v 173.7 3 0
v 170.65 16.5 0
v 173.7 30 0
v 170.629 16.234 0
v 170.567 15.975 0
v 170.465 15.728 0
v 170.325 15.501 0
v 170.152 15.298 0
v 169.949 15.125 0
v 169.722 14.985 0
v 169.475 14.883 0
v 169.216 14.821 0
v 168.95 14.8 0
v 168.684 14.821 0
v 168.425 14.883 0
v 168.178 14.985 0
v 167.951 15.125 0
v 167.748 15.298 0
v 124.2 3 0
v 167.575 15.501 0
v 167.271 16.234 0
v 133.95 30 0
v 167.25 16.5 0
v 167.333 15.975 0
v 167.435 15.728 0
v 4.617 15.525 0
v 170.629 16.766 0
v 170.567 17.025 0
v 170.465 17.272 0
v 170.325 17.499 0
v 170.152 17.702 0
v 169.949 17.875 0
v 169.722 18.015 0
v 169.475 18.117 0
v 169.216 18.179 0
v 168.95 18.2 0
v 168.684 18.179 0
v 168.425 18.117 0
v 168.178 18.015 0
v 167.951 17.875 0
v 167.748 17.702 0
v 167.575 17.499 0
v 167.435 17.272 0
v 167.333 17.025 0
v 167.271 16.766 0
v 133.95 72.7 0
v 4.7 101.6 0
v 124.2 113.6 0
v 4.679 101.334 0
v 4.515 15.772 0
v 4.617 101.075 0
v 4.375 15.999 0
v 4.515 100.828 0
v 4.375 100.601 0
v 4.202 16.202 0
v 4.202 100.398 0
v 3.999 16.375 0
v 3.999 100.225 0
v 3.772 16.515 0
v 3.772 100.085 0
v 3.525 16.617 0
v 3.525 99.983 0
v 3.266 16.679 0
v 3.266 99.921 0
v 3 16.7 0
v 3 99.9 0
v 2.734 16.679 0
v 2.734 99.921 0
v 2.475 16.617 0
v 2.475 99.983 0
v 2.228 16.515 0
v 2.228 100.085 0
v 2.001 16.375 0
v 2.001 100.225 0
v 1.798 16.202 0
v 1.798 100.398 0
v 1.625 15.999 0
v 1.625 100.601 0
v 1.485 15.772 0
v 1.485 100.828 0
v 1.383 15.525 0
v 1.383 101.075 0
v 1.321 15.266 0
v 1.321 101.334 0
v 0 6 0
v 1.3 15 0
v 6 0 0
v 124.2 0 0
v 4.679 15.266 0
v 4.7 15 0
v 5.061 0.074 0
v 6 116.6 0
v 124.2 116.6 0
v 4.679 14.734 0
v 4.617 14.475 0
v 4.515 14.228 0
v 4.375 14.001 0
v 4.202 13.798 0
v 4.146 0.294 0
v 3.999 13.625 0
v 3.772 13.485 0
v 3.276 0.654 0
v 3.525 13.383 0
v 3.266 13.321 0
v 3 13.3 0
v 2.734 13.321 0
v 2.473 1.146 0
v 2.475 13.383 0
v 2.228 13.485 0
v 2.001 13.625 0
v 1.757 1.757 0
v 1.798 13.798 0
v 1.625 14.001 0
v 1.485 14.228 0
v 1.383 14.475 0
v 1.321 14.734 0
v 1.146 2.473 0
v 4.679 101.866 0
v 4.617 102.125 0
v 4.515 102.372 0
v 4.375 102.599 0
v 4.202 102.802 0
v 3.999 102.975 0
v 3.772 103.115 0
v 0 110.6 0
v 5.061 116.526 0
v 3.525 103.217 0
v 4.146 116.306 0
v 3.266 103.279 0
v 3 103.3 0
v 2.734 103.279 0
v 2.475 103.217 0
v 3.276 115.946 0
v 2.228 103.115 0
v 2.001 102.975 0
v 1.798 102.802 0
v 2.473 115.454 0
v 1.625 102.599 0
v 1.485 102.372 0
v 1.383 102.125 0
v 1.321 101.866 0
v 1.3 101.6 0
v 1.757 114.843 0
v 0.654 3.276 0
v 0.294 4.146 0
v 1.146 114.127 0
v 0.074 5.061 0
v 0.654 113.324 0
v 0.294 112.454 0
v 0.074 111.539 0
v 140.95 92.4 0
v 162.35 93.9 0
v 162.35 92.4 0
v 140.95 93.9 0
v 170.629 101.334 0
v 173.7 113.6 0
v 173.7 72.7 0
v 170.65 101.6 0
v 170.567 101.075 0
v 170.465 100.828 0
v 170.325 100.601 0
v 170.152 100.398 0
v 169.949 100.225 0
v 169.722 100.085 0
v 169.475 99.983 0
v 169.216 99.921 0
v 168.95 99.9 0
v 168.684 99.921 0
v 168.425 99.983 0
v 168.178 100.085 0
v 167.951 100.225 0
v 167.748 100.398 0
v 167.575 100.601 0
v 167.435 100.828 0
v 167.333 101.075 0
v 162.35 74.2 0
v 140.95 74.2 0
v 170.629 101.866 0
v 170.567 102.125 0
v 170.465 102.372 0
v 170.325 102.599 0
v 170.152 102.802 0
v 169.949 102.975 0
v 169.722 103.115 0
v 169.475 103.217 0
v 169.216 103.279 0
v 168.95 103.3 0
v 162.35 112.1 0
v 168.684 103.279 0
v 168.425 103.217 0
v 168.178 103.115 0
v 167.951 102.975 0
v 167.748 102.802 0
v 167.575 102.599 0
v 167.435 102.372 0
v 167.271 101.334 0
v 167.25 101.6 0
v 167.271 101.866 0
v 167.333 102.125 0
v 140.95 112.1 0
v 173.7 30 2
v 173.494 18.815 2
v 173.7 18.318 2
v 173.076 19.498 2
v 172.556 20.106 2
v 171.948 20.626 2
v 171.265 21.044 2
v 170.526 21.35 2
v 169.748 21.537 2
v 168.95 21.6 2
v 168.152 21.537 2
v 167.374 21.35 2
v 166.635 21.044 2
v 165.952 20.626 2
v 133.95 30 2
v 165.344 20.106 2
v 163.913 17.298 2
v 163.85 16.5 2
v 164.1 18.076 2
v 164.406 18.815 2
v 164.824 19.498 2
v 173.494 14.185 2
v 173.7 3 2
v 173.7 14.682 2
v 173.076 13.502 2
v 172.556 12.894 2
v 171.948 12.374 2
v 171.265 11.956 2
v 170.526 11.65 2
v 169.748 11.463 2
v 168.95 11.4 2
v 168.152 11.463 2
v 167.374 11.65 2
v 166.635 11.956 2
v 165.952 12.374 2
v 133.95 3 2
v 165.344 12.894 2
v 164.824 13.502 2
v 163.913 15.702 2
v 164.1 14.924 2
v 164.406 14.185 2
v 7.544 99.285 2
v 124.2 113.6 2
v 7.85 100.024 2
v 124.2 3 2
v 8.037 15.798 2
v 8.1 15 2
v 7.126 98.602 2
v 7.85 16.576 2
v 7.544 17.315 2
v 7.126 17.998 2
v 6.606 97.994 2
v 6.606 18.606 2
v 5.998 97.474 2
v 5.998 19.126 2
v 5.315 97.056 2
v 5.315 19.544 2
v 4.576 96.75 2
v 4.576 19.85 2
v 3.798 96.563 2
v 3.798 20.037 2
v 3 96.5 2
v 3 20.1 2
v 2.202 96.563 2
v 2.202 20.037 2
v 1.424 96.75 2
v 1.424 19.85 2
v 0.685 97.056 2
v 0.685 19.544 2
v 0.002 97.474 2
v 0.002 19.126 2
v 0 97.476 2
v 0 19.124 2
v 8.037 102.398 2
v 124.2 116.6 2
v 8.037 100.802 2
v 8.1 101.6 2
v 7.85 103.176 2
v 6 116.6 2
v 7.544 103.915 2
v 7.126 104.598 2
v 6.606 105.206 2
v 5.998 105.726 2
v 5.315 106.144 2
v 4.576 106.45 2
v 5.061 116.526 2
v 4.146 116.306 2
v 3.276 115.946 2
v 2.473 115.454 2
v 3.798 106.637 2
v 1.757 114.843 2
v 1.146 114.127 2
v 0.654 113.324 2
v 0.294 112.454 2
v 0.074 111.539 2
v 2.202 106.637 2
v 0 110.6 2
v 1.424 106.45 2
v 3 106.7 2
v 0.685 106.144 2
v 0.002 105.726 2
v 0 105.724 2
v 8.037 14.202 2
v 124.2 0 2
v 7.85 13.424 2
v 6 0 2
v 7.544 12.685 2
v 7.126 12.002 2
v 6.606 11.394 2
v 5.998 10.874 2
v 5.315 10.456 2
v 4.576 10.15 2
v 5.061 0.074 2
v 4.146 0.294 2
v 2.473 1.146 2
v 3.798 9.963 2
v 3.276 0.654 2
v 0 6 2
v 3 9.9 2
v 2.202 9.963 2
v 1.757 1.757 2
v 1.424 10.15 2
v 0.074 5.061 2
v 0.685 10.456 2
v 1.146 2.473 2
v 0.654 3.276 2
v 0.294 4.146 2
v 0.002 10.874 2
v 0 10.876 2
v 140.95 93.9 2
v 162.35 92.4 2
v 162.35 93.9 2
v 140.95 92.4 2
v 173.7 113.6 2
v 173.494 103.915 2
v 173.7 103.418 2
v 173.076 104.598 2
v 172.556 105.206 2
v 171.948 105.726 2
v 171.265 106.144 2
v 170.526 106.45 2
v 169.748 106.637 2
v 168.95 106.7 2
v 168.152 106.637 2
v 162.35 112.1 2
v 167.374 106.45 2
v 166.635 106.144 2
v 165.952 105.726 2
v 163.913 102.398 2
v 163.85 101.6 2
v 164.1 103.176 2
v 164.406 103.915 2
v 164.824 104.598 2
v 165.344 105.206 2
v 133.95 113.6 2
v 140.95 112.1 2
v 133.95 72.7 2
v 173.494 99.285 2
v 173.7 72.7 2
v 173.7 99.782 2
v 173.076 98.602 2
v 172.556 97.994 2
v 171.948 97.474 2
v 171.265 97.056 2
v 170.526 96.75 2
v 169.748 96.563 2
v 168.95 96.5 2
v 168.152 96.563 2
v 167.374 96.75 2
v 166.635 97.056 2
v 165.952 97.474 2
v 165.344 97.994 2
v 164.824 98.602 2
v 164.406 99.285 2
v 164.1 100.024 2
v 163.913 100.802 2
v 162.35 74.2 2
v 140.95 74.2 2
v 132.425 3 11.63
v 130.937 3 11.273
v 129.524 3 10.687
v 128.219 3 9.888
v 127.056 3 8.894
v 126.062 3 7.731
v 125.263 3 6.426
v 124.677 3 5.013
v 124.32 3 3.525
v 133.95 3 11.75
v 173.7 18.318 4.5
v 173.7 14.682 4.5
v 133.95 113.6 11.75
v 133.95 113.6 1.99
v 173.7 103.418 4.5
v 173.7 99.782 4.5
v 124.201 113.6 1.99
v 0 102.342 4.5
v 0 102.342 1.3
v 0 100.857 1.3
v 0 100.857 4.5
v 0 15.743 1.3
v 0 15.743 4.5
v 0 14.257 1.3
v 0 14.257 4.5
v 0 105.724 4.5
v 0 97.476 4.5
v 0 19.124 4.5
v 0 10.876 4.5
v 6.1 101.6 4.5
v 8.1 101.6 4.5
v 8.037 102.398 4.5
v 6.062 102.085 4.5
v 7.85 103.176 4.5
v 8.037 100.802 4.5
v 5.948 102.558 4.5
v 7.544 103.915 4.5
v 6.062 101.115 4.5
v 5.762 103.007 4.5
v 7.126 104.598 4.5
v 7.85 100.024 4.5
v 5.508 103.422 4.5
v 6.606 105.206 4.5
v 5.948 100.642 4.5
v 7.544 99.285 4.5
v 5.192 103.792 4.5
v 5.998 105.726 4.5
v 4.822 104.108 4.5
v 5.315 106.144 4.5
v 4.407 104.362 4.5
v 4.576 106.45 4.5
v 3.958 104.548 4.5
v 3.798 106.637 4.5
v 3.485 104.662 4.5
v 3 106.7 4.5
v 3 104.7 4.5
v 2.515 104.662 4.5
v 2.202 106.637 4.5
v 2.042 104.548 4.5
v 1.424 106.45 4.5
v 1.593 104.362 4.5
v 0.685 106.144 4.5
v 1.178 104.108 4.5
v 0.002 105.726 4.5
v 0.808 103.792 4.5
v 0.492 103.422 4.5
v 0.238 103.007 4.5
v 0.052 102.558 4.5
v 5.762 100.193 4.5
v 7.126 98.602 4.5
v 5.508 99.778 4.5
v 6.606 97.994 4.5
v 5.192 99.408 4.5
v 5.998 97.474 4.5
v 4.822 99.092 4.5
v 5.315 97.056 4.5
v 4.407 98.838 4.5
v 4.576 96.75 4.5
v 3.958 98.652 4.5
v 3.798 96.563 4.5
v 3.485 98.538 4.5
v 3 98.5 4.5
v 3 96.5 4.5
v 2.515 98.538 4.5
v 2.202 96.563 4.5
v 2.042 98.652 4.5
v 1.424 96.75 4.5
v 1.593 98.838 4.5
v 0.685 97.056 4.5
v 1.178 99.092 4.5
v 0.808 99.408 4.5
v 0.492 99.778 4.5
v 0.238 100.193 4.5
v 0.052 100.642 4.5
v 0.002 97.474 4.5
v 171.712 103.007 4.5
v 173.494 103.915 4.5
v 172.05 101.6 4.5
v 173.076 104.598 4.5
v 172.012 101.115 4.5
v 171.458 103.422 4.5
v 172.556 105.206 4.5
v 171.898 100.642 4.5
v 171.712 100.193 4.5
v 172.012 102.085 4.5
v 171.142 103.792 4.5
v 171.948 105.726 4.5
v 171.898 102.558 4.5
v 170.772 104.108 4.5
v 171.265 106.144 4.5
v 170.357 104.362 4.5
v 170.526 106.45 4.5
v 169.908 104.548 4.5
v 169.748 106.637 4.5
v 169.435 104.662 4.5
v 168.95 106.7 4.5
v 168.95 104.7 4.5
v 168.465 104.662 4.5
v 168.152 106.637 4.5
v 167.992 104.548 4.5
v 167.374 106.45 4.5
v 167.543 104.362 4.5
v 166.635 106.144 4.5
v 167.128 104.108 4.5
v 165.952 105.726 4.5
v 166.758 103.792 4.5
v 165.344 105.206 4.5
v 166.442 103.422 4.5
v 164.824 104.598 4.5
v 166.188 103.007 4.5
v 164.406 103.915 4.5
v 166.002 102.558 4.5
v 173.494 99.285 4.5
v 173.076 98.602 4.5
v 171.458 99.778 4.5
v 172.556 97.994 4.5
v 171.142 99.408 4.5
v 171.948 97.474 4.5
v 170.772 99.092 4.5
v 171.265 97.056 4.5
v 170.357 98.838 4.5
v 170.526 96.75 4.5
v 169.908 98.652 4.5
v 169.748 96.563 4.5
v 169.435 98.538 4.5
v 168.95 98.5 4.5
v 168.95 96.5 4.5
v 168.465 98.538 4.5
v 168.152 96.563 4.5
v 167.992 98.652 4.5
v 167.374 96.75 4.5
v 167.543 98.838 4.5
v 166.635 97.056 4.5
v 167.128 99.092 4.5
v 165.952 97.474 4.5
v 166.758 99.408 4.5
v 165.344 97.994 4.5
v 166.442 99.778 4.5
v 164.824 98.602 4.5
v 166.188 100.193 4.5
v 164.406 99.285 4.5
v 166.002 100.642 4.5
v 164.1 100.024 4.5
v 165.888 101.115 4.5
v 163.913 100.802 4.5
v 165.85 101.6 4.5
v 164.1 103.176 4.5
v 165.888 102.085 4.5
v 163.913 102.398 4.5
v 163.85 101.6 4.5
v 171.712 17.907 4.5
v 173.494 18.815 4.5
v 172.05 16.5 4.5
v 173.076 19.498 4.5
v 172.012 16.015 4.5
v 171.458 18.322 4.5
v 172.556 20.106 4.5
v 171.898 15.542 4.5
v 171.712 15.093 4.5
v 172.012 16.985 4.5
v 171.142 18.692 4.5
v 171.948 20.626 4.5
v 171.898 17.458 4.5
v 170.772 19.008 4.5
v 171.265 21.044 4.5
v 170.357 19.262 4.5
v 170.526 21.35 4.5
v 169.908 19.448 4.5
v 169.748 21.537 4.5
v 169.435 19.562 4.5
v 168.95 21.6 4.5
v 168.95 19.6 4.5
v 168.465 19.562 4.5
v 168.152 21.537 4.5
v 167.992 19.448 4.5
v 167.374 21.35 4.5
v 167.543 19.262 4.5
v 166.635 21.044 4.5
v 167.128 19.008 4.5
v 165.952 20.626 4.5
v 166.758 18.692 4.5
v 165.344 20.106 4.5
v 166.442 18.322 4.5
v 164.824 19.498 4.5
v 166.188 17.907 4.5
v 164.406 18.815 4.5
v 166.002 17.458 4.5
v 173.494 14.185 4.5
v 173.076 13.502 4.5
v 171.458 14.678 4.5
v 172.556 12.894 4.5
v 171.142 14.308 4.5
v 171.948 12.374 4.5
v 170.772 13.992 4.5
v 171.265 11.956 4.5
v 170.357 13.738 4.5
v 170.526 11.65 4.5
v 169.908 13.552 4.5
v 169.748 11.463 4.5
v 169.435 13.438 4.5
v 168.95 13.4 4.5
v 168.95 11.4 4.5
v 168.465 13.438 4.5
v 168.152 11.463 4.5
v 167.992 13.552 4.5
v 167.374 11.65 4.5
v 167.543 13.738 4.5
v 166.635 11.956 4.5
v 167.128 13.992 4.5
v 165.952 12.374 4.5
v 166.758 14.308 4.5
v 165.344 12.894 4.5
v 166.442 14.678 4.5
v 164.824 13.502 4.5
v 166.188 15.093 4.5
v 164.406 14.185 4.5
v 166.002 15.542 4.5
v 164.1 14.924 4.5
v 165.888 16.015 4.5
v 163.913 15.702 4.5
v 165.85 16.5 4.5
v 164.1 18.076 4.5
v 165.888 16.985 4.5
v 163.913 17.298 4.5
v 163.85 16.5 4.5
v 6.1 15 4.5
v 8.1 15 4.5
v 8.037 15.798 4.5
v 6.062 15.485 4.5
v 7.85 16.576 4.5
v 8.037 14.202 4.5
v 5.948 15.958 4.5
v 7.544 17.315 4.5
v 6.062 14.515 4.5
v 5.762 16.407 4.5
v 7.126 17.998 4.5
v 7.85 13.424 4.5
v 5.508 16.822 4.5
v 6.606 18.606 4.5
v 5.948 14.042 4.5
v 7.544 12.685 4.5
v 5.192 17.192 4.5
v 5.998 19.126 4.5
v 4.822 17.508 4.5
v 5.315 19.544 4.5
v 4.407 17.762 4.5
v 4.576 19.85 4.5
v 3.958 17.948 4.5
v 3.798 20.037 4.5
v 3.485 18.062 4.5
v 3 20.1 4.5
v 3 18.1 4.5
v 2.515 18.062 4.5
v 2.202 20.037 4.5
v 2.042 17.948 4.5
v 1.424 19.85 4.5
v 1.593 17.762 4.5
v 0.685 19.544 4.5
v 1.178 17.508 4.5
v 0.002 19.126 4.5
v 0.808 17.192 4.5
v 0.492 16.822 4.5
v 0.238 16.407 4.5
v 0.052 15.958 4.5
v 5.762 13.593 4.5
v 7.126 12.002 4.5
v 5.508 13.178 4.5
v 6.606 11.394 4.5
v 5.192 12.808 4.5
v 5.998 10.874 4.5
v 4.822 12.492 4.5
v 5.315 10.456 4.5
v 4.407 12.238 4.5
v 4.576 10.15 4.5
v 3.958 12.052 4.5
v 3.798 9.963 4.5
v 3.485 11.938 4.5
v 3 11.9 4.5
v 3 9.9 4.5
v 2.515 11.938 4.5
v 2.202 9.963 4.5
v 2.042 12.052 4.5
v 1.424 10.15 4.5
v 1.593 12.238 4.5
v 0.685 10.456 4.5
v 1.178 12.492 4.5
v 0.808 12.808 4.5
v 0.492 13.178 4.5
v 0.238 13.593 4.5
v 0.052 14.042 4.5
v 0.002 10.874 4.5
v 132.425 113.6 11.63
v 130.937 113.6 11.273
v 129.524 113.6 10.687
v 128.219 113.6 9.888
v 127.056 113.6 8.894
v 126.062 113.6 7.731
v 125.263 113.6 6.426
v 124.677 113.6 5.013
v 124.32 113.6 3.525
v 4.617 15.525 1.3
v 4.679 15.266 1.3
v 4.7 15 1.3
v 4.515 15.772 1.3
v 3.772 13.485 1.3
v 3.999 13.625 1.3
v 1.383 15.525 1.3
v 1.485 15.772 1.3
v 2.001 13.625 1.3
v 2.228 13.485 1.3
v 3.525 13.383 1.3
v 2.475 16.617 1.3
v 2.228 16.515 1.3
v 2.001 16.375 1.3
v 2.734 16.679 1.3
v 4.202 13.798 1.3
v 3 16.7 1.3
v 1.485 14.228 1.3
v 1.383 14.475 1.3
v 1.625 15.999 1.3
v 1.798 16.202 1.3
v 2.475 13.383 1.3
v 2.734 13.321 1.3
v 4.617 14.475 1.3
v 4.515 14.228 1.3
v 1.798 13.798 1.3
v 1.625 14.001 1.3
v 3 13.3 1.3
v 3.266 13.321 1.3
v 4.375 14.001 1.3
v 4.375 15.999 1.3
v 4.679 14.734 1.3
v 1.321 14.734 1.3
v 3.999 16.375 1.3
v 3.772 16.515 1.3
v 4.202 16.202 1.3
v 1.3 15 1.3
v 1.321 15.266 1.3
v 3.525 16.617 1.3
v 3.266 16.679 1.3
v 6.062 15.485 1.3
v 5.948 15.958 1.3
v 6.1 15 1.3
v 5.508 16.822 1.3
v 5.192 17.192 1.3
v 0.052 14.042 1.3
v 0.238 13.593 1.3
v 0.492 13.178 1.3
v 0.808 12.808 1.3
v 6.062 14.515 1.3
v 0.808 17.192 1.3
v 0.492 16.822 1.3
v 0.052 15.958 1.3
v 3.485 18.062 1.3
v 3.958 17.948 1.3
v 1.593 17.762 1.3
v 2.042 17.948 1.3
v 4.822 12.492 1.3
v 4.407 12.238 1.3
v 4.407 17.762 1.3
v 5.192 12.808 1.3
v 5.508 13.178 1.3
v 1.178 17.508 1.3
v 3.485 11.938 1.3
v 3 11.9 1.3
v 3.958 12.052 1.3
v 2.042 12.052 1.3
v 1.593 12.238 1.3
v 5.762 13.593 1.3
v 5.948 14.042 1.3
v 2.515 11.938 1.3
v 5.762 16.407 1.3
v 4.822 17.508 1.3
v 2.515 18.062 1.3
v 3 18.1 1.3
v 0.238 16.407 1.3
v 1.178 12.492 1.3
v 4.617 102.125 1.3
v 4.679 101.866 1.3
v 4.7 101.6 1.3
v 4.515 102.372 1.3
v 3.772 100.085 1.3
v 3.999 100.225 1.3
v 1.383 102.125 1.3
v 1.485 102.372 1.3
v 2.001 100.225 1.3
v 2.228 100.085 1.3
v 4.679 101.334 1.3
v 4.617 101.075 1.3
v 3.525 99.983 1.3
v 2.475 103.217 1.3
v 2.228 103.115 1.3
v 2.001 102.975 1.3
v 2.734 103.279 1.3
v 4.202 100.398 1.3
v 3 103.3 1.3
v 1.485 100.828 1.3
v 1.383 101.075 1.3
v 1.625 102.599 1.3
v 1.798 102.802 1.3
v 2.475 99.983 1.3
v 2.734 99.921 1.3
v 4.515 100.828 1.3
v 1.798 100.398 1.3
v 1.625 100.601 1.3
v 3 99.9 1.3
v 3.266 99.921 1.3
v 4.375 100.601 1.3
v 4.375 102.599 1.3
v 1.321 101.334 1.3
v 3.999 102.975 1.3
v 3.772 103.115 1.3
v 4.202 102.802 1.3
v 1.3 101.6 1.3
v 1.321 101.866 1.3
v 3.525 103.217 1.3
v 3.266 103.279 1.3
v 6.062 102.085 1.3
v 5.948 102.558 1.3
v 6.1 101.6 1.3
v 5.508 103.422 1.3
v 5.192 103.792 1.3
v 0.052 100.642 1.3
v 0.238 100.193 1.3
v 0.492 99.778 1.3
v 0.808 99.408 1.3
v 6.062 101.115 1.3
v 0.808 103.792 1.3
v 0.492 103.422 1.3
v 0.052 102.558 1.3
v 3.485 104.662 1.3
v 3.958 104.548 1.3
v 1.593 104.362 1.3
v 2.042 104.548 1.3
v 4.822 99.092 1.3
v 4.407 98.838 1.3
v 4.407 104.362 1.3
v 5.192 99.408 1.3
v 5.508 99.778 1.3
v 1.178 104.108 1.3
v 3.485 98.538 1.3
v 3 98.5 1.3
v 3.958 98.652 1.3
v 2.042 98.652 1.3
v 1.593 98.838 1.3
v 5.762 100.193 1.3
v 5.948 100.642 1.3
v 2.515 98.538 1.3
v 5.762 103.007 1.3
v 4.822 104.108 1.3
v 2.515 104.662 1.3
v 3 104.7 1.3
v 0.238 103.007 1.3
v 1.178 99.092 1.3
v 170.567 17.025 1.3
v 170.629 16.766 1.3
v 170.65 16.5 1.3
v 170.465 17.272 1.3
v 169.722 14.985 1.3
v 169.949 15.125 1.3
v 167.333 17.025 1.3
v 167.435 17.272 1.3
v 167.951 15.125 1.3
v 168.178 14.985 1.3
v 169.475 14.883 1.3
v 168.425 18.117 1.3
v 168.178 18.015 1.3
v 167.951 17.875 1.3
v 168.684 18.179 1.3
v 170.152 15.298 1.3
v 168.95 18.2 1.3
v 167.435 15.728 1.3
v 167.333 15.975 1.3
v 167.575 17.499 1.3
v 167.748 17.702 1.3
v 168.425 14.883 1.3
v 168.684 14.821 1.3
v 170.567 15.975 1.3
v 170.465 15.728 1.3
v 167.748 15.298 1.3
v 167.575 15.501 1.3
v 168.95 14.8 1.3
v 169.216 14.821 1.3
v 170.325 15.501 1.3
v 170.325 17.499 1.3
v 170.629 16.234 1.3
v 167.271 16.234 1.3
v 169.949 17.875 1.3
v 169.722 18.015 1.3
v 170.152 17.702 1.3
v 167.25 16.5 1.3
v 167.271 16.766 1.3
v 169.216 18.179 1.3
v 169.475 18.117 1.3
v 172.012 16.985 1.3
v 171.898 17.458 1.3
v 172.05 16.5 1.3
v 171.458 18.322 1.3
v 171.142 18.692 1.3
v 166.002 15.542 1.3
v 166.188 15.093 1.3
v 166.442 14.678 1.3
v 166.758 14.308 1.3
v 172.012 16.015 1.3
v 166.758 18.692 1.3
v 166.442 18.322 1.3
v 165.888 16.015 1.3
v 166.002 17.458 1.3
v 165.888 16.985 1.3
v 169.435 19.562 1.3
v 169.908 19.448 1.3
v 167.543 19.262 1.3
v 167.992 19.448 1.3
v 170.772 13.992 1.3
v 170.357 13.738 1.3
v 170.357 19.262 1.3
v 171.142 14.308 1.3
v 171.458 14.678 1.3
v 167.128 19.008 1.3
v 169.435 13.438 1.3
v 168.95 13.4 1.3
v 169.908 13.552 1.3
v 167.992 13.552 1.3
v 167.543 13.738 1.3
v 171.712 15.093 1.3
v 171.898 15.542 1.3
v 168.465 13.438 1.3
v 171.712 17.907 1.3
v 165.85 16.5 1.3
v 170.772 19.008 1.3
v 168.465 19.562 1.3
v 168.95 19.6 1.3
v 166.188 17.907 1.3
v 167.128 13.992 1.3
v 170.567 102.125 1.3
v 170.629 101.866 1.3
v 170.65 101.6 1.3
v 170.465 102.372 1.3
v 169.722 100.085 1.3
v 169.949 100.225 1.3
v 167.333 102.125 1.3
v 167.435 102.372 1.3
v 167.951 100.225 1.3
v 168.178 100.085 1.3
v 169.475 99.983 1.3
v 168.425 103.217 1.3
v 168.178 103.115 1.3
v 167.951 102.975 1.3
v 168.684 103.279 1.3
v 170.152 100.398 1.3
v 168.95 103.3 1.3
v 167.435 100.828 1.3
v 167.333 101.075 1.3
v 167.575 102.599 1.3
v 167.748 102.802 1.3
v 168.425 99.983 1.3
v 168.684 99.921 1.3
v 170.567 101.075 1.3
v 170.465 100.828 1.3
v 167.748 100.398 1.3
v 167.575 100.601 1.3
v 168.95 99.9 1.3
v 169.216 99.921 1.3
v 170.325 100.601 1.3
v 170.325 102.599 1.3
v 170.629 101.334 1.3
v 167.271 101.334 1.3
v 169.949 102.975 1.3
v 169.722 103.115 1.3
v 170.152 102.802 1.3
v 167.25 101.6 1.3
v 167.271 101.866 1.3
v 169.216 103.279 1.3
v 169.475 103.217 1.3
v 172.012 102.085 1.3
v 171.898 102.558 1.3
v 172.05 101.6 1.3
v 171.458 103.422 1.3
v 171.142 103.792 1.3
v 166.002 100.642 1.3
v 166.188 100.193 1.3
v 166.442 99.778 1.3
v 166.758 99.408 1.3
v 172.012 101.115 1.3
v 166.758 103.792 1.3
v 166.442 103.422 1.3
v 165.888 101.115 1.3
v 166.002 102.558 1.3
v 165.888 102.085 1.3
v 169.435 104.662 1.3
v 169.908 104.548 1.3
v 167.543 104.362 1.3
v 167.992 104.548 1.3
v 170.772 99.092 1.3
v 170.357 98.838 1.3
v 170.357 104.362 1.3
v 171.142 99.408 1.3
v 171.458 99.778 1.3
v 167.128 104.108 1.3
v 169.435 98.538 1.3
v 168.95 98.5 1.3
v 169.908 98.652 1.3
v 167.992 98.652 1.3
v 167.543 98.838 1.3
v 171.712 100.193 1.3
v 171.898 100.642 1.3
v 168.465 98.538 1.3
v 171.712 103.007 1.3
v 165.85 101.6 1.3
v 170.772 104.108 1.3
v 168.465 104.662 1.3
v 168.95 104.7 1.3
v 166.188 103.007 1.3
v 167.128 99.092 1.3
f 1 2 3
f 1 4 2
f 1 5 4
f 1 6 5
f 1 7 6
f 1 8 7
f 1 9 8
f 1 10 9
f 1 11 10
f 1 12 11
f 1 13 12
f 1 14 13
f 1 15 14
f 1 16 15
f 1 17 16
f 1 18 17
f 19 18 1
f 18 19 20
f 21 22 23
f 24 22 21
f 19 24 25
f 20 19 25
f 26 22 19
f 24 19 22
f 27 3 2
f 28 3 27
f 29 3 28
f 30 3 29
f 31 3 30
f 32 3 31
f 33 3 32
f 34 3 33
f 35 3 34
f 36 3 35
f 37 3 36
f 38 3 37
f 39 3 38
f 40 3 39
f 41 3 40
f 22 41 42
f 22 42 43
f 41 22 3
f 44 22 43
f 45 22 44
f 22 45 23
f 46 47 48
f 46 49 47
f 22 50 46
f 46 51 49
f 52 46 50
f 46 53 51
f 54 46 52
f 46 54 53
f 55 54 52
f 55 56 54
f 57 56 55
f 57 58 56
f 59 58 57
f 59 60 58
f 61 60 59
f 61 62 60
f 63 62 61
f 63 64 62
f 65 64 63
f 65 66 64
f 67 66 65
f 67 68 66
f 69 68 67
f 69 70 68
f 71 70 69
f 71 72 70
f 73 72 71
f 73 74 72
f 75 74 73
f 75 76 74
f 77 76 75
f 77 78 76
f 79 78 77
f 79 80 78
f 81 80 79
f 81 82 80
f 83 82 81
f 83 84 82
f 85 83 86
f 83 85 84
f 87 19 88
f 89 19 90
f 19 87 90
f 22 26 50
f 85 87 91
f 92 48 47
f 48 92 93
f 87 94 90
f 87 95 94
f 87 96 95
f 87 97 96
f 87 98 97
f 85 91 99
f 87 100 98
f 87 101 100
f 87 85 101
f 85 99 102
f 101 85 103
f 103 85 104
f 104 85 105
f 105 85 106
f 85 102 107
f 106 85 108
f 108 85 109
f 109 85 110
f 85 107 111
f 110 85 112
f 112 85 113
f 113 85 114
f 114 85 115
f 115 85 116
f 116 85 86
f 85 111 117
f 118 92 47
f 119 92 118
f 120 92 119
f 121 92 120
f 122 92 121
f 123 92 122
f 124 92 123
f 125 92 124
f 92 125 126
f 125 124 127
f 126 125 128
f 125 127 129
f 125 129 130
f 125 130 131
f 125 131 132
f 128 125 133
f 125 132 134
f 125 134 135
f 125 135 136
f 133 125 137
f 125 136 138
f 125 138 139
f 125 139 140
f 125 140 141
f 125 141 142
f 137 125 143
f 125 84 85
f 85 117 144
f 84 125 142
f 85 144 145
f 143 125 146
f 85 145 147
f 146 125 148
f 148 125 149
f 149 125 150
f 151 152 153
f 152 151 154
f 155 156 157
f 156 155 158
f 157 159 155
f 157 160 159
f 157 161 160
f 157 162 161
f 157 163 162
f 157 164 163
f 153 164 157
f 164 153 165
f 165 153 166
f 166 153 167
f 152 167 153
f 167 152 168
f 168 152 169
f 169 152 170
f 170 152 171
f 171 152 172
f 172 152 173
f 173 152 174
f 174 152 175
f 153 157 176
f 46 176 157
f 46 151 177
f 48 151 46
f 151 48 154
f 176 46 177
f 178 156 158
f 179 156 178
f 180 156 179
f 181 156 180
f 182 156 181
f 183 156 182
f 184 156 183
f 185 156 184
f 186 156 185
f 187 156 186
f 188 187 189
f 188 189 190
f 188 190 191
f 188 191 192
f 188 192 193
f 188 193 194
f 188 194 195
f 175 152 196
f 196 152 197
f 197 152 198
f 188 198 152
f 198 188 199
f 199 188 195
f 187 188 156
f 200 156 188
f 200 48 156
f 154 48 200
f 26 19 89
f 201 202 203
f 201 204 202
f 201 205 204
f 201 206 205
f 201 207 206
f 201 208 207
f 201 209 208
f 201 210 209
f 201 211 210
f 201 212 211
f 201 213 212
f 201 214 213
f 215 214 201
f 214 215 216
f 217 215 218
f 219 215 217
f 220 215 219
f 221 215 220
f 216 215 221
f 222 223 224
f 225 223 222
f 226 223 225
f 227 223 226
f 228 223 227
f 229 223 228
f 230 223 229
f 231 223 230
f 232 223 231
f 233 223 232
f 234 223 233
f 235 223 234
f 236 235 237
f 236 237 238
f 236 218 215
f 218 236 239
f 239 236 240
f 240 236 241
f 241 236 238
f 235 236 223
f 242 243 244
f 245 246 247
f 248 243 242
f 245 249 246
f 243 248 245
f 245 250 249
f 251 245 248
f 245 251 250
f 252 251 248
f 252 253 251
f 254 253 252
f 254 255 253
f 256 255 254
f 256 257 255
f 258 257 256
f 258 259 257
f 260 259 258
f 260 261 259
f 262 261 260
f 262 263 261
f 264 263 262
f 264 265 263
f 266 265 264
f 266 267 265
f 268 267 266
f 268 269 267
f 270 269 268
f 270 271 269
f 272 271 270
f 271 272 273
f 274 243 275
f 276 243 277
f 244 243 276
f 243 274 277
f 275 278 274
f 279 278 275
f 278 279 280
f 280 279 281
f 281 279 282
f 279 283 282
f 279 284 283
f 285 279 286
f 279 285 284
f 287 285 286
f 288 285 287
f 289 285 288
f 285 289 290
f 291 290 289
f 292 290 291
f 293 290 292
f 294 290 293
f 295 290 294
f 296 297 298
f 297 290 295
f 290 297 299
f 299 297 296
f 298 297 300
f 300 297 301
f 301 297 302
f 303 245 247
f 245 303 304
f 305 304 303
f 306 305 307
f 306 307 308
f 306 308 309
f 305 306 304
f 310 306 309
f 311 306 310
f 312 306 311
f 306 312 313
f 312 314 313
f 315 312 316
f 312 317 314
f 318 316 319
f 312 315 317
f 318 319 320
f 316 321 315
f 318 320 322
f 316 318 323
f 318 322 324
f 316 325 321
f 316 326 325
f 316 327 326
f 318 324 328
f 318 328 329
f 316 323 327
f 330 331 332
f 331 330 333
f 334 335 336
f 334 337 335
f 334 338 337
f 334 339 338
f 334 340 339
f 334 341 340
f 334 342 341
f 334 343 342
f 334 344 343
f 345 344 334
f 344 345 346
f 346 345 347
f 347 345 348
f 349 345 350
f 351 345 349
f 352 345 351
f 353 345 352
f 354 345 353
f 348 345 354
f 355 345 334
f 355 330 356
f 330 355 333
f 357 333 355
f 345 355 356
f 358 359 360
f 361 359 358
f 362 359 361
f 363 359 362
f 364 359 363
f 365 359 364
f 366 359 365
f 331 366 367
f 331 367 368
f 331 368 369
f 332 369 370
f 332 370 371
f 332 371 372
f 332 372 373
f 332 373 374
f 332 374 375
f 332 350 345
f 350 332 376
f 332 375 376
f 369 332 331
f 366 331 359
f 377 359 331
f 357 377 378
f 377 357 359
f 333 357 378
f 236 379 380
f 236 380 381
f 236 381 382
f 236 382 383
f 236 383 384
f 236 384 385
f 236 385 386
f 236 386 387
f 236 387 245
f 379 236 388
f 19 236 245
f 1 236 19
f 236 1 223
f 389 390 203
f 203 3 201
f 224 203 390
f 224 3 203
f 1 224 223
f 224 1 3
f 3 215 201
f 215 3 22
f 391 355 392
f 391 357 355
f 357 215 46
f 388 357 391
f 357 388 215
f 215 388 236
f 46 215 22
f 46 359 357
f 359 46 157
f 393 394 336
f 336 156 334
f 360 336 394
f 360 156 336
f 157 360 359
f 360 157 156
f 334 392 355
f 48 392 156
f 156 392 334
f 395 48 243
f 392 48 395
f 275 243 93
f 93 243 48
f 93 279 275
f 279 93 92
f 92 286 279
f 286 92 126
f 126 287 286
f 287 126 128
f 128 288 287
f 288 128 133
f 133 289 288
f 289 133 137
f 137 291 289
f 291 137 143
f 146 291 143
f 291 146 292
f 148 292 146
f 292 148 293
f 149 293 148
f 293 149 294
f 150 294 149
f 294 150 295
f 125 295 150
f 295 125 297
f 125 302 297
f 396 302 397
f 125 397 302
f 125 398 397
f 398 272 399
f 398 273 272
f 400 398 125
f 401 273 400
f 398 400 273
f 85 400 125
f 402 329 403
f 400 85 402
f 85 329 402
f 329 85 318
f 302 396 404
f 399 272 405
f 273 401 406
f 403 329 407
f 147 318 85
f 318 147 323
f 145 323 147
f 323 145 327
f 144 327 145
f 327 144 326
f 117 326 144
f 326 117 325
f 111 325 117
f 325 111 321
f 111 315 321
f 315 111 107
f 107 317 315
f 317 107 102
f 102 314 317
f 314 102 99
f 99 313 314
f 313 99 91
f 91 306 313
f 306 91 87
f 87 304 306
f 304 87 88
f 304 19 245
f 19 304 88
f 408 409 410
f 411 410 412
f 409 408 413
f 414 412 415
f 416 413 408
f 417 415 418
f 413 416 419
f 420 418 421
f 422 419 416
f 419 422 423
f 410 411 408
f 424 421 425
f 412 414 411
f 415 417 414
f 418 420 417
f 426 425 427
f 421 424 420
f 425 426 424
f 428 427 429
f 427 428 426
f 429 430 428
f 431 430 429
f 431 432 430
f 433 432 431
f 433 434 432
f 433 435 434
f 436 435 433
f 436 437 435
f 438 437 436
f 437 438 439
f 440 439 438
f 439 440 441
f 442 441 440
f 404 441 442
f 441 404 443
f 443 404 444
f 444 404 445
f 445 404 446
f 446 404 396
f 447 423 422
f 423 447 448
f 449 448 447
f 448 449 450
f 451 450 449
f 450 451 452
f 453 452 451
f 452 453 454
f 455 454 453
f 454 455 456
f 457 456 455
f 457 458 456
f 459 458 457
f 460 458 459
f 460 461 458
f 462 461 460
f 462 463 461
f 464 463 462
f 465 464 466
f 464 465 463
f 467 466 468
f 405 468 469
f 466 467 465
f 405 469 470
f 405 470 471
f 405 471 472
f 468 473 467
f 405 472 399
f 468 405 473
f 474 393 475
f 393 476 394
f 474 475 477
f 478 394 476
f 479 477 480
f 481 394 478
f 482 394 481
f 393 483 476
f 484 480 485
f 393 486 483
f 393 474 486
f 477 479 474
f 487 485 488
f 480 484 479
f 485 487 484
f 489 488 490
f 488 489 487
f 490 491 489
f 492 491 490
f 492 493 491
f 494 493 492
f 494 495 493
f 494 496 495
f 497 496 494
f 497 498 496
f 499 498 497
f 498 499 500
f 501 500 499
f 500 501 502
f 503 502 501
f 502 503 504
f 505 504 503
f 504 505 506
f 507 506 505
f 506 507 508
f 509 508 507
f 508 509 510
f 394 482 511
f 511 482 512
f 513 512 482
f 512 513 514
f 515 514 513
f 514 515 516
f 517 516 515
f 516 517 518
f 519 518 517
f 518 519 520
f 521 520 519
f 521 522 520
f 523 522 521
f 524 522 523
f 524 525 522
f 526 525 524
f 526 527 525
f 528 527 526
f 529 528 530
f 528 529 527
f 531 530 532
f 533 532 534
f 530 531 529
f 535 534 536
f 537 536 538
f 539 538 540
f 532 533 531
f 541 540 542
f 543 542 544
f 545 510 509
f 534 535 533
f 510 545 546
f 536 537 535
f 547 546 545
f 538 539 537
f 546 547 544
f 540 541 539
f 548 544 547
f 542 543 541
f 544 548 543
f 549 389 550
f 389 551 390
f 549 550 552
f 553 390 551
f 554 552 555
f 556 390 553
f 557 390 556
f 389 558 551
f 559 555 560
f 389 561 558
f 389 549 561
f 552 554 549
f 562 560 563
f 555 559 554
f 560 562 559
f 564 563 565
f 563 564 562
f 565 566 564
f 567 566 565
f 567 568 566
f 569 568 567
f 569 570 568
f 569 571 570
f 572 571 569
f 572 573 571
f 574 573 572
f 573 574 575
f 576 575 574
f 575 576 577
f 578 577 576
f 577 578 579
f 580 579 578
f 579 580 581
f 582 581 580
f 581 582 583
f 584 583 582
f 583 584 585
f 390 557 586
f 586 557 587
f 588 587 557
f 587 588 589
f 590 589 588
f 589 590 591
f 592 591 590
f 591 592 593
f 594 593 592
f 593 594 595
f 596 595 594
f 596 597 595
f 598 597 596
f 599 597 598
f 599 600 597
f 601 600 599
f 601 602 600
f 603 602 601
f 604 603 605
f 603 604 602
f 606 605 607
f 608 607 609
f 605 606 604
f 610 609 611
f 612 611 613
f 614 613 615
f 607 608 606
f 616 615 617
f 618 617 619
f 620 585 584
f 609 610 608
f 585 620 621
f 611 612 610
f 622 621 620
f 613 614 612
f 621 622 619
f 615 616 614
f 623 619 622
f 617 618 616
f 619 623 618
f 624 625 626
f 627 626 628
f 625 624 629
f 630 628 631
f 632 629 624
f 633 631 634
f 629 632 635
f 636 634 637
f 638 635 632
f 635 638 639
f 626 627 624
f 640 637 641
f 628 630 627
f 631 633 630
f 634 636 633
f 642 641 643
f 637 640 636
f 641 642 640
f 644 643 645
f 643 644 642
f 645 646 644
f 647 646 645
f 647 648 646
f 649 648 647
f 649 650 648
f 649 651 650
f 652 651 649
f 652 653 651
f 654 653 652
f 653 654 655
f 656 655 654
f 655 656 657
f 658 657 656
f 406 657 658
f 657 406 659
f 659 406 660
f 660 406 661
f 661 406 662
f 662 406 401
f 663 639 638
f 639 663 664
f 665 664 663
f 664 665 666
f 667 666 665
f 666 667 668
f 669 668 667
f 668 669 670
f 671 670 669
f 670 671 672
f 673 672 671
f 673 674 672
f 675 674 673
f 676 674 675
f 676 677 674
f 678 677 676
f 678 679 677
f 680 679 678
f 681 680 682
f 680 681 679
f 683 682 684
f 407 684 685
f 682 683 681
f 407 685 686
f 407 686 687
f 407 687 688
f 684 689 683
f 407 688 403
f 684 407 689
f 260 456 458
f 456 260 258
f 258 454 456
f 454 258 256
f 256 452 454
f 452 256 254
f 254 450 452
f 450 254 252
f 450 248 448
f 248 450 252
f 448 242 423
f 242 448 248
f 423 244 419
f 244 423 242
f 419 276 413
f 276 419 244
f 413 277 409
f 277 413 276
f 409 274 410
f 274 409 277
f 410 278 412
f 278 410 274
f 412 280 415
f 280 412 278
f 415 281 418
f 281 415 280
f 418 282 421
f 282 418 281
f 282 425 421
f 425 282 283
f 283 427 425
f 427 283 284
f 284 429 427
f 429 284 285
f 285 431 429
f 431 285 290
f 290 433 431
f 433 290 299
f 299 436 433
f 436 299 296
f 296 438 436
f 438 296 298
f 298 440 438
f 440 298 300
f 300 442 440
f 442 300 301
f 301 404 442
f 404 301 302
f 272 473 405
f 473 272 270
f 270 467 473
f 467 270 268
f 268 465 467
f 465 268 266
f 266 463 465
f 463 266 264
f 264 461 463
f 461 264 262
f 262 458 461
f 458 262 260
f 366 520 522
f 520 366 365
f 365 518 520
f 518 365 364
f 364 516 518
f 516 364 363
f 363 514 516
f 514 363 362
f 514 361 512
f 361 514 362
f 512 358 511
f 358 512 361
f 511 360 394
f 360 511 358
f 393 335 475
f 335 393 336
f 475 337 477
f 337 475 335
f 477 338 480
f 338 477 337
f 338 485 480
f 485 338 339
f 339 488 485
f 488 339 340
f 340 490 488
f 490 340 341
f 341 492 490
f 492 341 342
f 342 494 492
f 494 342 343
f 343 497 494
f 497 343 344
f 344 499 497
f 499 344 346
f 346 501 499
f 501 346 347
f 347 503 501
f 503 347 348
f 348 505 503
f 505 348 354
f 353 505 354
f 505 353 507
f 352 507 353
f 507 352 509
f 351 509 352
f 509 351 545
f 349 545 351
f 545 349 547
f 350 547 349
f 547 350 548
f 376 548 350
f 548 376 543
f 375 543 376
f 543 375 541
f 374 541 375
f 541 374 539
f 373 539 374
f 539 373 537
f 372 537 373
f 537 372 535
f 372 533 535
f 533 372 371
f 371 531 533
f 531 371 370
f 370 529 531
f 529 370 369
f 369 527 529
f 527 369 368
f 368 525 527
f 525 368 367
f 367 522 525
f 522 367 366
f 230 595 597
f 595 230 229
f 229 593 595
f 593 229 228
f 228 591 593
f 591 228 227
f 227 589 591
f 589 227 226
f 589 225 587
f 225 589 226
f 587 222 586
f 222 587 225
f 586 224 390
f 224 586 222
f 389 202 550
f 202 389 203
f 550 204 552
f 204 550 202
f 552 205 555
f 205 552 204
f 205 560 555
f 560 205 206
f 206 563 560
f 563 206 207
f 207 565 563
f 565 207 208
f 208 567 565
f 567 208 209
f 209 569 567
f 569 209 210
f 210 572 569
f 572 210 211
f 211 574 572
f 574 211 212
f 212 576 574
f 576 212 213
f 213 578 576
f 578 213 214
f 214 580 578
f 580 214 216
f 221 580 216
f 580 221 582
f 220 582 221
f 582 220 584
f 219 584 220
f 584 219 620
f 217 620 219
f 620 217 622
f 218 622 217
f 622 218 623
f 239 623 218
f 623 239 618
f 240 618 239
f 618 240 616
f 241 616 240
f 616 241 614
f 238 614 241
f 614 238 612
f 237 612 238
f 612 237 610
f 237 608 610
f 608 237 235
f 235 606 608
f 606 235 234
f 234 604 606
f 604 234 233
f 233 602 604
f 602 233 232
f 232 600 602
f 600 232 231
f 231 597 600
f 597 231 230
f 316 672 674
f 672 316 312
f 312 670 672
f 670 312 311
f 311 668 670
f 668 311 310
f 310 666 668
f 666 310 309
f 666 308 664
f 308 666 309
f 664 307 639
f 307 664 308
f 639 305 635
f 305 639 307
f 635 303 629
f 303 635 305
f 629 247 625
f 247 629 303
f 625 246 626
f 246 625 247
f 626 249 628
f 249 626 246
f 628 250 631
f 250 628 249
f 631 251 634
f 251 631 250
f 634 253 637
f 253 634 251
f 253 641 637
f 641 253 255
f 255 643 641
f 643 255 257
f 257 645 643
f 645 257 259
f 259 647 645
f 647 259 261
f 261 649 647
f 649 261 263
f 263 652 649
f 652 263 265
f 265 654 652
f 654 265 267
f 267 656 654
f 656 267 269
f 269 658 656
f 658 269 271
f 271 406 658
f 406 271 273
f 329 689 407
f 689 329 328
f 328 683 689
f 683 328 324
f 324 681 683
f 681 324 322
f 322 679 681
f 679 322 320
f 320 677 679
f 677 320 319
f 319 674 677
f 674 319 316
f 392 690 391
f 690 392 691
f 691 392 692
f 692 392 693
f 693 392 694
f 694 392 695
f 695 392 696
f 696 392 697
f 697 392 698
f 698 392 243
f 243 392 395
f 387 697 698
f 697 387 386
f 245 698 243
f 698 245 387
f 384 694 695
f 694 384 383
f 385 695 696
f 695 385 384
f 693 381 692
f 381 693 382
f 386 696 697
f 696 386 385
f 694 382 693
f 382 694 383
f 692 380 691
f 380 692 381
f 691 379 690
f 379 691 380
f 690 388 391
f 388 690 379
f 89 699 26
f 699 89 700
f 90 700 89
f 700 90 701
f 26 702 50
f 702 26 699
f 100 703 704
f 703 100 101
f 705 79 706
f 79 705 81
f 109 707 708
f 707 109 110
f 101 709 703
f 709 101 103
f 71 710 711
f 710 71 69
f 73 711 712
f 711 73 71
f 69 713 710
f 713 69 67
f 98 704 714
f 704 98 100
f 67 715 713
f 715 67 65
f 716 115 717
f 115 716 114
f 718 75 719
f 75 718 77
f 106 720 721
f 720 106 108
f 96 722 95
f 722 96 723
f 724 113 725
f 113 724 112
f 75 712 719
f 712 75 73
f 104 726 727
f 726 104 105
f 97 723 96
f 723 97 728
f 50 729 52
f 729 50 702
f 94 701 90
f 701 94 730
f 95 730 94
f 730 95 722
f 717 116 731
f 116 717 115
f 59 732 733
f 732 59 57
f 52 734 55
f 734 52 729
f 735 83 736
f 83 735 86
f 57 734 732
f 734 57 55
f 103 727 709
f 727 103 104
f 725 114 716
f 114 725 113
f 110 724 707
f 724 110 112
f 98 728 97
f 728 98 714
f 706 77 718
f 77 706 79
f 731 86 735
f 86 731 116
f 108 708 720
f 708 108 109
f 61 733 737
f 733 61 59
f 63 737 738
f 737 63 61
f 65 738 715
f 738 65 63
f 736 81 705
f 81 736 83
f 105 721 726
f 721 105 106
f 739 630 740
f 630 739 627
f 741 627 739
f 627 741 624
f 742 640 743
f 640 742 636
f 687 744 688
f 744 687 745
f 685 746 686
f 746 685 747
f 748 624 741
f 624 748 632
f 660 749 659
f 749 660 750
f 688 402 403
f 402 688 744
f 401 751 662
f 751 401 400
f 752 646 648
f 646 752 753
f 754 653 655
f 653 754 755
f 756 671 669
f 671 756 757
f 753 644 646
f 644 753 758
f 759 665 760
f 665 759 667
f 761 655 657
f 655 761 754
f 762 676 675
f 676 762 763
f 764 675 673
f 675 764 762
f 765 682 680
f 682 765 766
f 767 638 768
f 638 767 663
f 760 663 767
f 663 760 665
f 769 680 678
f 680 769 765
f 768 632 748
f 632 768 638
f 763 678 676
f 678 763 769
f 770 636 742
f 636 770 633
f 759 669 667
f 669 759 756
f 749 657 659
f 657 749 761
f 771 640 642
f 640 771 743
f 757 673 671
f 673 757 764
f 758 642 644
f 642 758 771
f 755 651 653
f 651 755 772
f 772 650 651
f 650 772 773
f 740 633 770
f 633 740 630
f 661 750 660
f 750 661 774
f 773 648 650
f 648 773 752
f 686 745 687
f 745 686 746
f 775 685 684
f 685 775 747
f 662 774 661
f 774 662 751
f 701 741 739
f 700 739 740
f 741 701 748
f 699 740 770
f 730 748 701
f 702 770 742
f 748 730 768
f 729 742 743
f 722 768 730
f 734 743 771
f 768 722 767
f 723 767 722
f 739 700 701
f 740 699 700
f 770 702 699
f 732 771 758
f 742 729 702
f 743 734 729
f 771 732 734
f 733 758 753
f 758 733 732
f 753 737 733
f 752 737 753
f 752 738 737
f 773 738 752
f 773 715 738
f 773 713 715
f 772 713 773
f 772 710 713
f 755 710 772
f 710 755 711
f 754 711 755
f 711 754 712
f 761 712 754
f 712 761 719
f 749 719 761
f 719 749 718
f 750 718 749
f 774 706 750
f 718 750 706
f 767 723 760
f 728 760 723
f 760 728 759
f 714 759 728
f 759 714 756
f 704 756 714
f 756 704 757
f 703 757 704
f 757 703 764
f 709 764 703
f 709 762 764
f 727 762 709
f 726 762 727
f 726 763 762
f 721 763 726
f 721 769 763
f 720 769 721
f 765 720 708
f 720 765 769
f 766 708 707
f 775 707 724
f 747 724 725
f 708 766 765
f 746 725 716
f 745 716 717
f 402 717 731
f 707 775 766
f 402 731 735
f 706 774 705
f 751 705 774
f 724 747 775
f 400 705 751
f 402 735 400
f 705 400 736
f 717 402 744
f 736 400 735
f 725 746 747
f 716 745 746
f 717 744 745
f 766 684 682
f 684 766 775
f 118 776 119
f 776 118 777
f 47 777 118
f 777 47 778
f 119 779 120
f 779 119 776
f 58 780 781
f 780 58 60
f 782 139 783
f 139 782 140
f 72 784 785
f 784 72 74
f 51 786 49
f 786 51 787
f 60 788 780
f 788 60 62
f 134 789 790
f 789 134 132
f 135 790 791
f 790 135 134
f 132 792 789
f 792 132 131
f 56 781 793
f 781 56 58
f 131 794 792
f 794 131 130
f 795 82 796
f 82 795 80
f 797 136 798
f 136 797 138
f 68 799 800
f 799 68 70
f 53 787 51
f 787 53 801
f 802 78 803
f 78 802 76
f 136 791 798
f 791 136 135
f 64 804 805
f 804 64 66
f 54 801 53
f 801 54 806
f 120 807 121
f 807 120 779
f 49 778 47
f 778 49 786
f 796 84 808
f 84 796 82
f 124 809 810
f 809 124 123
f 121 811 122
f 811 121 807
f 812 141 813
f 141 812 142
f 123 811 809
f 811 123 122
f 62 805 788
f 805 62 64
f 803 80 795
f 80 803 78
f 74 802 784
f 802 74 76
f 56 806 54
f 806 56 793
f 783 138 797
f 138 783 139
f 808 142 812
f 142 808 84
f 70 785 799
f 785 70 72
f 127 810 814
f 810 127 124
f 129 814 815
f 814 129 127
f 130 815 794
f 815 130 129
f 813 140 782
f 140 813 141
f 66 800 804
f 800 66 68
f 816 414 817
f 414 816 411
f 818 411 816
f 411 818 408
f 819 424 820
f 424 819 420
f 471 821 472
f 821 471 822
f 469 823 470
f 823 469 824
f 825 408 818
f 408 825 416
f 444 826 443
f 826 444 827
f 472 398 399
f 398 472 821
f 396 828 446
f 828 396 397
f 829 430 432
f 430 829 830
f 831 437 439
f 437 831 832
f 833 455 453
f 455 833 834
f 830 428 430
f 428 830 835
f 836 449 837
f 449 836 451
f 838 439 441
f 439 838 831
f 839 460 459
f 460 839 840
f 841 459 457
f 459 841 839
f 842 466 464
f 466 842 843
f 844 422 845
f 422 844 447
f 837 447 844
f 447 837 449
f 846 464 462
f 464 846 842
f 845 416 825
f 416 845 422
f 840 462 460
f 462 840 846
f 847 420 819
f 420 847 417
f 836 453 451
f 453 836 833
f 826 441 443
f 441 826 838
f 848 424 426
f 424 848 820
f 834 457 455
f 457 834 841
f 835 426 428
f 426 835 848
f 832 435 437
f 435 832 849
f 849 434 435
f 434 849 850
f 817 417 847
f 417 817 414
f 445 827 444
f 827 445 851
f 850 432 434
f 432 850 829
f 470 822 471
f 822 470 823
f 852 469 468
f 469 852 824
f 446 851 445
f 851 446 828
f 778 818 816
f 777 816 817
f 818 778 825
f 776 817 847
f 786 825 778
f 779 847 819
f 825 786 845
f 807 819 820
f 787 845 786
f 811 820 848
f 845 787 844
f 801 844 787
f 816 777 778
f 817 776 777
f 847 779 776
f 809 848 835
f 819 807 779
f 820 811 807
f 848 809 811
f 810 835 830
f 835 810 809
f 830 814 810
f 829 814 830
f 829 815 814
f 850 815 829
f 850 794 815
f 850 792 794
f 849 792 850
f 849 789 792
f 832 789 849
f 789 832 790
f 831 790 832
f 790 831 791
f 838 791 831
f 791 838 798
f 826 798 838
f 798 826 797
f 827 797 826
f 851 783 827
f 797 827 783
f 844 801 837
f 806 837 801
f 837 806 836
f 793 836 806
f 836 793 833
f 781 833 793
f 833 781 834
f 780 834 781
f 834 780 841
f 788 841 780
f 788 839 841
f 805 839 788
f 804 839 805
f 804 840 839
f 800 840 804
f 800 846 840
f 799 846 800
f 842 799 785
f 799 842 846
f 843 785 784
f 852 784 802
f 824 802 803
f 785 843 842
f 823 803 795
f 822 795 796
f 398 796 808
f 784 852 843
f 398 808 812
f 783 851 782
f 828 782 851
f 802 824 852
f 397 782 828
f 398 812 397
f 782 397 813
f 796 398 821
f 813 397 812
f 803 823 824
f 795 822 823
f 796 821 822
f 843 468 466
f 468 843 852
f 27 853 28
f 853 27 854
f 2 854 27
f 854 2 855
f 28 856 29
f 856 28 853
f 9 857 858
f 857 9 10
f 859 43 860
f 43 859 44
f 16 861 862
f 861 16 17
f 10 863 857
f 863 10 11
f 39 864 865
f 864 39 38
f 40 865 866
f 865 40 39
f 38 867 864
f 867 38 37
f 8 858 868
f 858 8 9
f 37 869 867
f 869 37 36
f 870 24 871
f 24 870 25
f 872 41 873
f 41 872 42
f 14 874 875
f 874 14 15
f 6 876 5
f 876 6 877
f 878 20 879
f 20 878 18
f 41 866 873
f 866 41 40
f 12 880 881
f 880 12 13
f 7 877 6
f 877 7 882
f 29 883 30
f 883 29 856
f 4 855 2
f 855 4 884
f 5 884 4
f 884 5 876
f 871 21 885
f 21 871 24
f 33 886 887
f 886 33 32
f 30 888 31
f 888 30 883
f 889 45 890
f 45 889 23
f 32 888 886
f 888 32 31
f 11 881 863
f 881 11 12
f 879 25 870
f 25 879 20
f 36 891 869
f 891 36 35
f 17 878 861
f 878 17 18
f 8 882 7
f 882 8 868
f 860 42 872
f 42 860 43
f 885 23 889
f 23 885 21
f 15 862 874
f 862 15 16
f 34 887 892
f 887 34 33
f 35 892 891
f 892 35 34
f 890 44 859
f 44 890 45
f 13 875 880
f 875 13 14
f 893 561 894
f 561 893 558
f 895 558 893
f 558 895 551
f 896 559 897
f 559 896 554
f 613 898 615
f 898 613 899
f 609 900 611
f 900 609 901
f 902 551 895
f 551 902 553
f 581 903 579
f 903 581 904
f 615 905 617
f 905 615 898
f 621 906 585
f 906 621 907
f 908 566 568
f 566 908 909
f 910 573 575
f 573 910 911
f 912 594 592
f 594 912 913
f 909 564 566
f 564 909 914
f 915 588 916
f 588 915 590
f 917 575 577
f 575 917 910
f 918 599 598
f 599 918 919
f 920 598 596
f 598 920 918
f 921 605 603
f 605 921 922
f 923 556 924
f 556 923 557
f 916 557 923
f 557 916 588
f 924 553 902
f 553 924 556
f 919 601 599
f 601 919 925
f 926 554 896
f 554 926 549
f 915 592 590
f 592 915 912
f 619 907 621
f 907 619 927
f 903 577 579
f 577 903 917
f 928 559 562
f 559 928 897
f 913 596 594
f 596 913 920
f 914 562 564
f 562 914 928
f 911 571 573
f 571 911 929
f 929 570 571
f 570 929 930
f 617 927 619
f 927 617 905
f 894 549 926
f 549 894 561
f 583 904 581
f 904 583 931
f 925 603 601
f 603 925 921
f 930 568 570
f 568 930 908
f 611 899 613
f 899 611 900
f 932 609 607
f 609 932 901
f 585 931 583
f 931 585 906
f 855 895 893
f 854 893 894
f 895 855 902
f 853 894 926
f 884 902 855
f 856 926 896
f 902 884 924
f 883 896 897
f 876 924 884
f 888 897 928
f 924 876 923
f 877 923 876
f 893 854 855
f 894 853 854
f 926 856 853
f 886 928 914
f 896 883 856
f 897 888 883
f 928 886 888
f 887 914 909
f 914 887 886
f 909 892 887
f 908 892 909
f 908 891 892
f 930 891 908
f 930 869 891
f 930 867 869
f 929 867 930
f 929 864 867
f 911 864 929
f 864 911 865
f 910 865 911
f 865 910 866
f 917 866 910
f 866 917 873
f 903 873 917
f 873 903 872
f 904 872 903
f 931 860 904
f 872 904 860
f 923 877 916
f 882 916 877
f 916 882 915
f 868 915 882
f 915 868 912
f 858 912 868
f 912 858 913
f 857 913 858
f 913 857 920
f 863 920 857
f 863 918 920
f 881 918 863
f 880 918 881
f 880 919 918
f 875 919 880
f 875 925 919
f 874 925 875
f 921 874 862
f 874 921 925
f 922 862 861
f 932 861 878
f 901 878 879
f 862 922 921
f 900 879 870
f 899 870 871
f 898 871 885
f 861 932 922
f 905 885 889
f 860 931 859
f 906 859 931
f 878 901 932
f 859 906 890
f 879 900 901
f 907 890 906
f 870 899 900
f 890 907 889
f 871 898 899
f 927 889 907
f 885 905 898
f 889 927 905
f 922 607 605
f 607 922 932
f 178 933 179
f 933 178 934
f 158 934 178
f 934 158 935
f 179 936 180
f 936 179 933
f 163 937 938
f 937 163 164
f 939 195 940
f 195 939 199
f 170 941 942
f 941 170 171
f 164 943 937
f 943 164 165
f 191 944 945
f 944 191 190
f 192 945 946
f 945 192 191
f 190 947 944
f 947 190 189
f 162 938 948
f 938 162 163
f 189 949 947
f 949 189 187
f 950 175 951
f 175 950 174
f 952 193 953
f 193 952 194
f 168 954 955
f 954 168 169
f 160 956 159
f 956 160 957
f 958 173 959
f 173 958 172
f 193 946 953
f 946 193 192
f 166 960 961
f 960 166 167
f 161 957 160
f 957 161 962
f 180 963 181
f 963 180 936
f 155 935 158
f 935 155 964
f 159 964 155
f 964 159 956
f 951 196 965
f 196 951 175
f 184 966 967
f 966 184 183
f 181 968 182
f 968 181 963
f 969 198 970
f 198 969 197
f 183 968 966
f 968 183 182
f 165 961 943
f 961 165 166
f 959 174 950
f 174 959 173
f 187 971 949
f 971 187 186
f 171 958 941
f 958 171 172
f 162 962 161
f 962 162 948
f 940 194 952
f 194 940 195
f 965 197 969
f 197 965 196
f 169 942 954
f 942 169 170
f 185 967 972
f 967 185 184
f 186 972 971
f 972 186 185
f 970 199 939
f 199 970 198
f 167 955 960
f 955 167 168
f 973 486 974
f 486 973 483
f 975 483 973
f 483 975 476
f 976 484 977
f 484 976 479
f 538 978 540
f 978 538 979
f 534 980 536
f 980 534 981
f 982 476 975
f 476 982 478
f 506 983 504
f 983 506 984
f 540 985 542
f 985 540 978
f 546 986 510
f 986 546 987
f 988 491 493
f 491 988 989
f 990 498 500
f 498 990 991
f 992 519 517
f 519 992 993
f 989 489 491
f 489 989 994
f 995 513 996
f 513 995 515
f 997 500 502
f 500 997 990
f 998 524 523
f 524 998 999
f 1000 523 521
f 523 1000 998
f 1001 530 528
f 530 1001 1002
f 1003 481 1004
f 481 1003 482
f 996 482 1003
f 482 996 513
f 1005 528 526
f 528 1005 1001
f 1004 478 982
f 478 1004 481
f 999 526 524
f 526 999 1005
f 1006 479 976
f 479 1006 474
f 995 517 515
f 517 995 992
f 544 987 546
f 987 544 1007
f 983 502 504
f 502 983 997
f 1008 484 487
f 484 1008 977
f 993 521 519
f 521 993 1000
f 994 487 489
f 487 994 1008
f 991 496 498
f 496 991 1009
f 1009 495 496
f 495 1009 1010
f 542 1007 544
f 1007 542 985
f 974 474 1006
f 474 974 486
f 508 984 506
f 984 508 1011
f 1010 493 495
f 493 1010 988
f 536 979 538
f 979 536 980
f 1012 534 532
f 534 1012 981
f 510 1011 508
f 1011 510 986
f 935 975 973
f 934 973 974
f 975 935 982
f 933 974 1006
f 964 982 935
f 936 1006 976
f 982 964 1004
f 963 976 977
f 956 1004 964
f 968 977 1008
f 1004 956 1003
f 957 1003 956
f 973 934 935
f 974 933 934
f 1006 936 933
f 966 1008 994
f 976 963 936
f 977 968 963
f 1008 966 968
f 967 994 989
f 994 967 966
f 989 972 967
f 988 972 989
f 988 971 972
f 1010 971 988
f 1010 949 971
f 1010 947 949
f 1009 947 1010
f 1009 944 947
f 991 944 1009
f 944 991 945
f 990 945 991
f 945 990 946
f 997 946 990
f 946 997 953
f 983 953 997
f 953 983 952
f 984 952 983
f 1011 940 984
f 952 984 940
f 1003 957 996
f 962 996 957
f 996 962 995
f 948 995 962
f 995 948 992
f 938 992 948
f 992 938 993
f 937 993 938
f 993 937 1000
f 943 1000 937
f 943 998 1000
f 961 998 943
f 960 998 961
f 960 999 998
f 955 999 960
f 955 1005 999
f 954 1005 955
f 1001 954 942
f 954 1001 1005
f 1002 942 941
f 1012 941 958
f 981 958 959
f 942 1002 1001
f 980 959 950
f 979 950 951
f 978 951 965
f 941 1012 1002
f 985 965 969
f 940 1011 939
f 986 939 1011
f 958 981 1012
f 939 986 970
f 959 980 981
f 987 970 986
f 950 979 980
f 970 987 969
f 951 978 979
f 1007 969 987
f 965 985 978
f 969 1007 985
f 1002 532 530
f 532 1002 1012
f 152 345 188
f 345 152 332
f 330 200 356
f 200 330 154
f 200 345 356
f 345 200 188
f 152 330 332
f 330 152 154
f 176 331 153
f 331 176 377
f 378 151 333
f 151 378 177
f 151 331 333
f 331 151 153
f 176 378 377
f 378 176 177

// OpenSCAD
include <../lib/kobo-meshcore-case-lib.scad>;
$fn = 40;
color("#e8a33d") back_plate();
